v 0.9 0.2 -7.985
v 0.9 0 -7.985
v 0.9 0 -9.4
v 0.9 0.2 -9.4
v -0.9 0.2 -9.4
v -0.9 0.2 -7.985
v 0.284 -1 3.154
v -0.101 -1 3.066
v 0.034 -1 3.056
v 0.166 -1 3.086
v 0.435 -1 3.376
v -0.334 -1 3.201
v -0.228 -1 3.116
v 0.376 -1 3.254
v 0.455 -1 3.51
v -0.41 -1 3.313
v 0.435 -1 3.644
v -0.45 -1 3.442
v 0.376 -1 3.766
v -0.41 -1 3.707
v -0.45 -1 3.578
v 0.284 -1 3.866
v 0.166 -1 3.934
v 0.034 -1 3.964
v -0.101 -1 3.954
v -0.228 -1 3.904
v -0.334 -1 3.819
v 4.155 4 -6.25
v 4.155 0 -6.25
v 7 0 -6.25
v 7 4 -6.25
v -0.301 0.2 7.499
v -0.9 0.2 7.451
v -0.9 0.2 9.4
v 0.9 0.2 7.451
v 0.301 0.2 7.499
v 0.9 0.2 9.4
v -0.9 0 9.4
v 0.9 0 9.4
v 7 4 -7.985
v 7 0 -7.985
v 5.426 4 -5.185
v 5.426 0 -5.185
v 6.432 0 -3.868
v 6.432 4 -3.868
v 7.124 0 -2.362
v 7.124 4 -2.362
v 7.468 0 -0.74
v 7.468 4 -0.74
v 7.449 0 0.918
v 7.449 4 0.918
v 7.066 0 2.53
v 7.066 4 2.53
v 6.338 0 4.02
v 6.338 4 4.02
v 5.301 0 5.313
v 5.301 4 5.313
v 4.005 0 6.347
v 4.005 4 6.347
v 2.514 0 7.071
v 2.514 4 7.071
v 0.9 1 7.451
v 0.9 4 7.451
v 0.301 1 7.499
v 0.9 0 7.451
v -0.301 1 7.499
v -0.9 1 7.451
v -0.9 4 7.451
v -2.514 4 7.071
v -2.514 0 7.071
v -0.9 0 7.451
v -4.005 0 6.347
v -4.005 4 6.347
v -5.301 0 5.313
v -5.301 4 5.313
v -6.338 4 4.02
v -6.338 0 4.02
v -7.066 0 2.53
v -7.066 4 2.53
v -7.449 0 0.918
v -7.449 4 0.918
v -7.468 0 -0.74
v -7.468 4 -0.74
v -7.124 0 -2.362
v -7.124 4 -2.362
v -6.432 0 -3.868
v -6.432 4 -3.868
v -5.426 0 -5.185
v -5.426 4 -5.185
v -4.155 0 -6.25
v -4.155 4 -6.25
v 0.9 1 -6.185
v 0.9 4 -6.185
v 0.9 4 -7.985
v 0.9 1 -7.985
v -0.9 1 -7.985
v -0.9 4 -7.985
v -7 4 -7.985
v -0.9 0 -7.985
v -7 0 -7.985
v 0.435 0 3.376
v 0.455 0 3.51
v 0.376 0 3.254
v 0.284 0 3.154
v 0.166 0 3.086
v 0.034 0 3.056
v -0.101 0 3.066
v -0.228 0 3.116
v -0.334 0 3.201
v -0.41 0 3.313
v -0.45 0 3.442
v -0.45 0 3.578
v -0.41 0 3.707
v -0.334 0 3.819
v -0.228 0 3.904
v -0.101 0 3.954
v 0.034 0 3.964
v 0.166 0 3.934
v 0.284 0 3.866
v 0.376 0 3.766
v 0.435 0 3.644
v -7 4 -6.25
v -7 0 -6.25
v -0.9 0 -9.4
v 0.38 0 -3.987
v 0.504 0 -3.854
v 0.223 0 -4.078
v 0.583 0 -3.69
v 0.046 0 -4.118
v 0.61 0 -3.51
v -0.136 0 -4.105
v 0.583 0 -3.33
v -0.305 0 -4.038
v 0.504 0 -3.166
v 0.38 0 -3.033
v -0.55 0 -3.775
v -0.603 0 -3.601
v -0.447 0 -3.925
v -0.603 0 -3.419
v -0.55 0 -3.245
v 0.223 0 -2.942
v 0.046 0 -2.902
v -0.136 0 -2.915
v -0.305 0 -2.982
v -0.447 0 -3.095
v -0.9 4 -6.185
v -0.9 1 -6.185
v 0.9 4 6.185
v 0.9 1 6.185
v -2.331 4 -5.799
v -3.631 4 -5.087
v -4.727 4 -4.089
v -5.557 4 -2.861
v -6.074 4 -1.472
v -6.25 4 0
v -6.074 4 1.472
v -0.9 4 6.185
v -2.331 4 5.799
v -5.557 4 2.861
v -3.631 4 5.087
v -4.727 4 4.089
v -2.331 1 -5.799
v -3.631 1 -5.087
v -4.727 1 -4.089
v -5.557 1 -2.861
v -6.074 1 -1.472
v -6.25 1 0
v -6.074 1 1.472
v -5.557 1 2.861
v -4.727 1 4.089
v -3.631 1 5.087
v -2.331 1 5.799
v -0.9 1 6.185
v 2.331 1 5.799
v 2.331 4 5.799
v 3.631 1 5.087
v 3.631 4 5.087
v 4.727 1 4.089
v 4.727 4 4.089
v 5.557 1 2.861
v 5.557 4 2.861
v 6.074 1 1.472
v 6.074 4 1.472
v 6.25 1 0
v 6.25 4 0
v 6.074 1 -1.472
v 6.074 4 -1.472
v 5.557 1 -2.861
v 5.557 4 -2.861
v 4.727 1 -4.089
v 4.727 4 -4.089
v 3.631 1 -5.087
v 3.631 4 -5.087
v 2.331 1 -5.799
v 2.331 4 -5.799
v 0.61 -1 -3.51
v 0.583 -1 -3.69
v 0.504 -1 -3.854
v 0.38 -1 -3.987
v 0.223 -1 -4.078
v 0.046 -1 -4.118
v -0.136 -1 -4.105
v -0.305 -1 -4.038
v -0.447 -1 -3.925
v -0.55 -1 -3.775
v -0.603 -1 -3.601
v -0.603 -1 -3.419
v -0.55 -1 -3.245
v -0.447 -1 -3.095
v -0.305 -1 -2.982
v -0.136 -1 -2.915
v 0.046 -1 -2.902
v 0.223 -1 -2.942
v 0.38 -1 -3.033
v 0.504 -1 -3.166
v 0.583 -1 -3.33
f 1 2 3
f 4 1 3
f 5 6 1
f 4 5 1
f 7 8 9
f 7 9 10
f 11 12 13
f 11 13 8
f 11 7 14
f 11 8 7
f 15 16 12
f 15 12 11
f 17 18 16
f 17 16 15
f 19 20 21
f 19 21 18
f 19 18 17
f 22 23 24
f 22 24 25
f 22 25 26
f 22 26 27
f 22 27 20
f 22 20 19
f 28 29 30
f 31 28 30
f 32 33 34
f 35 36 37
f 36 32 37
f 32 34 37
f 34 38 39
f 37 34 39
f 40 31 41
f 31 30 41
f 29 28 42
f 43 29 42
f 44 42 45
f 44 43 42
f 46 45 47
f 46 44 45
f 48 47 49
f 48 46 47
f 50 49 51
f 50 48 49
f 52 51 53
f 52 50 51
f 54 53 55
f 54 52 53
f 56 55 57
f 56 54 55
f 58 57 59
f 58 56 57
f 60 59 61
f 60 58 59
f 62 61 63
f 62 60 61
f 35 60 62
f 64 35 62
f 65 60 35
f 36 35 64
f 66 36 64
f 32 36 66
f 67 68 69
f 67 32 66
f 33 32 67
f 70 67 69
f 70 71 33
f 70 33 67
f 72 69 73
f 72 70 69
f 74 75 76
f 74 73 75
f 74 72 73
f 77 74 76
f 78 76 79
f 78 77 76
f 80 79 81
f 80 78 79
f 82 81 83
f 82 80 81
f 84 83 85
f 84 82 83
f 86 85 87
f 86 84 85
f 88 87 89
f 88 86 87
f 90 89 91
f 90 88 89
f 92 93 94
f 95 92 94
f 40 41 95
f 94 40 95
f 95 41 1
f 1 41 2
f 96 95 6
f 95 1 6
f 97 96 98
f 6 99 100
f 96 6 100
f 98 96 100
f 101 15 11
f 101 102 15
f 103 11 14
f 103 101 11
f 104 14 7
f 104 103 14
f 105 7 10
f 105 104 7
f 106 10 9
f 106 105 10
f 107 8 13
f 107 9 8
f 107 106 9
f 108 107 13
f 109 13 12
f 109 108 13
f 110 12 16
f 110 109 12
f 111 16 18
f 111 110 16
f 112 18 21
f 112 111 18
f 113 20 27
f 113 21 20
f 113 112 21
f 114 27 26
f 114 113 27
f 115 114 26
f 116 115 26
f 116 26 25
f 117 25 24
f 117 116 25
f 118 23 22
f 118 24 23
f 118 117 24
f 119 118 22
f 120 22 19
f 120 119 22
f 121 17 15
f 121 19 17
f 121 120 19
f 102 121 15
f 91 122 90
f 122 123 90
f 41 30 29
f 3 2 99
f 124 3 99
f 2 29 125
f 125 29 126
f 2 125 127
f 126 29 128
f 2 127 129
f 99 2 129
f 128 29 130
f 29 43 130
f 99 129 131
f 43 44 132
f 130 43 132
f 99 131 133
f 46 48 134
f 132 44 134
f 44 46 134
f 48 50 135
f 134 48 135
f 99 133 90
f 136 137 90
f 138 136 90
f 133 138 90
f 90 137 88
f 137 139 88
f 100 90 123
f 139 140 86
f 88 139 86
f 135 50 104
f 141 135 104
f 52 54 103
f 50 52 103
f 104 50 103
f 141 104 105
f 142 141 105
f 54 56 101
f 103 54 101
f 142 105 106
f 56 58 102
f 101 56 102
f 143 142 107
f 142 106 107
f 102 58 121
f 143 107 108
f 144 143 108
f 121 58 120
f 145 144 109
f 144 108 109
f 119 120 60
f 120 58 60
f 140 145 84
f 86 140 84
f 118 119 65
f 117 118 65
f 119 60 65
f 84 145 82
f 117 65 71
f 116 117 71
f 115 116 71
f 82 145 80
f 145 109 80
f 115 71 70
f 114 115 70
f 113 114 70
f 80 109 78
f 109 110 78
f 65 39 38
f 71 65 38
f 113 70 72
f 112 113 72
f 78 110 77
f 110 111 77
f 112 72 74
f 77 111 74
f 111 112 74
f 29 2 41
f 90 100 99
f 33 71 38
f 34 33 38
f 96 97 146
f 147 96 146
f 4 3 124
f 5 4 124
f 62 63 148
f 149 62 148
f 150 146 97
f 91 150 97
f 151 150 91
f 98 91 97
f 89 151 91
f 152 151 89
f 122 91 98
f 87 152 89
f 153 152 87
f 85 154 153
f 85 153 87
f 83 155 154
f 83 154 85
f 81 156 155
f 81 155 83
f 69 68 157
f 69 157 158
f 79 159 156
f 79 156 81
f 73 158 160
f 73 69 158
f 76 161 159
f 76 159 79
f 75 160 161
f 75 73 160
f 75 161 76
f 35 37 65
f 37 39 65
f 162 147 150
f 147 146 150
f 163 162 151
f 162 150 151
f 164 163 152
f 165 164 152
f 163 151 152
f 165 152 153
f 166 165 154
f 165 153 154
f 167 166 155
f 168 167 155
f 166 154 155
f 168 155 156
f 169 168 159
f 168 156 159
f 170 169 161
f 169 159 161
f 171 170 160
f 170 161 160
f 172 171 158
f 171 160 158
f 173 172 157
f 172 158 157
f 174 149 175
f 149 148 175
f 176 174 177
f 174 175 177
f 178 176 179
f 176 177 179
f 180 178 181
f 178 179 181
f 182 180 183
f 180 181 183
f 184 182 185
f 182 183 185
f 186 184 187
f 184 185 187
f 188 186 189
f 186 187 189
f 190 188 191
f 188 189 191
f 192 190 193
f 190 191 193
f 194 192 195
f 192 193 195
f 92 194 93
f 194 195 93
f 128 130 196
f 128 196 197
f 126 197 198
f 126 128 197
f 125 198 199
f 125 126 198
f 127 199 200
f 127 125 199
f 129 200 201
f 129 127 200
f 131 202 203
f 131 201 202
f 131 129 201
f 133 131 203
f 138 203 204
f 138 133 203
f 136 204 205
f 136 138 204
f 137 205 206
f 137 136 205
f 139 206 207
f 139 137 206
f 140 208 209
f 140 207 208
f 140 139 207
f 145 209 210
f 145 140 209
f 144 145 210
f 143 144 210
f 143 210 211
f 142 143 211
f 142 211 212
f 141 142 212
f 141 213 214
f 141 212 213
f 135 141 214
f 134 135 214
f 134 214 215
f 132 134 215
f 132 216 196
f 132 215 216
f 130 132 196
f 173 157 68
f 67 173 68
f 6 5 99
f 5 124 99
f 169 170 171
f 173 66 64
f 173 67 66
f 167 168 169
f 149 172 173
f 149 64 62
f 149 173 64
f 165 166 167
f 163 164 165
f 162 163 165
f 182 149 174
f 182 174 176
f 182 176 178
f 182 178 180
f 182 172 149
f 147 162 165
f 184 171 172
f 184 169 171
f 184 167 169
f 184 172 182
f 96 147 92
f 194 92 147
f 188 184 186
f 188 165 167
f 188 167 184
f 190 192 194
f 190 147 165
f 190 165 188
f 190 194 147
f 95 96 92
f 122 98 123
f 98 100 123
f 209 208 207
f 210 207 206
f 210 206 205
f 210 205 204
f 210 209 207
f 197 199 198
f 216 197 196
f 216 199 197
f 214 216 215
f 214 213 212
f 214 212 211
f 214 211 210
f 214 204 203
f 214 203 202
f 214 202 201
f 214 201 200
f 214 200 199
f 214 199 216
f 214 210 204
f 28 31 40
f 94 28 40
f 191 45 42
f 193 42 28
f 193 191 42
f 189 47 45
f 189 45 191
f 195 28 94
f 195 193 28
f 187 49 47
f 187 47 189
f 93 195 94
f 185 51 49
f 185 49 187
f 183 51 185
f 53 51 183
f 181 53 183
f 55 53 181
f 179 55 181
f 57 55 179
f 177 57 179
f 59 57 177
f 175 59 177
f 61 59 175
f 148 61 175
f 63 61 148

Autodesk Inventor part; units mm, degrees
ref_plane "YZ Plane" through (0, 0, 0) normal (1, 0, 0) x (0, 1, 0)
ref_plane "XZ Plane" through (0, 0, 0) normal (0, 1, 0) x (-1, 0, 0)
ref_plane "XY Plane" through (0, 0, 0) normal (0, 0, 1) x (1, 0, 0)
sketch "Sketch1" plane through (0, 0, 0) normal (0, 1, 0) x (-1, 0, 0)
  arc A0 (4.1548, -6.25) -> (-4.1548, -6.25) centre (0, 0) ccw
  circle A1 centre (0, 0) radius 6.25 construction
  line L0 (-7, -6.25) -> (-7, -7.985)
  line L1 (-7, -7.985) -> (7, -7.985)
  line L2 (7, -7.985) -> (7, -6.25)
  line L3 (0, 7.505) -> (-2.894, 7.505)
  line L4 (7, -6.25) -> (4.1548, -6.25)
  line L5 (-4.1548, -6.25) -> (-7, -6.25)
  dimension "d0" = 15.01
  dimension "d1" = 12.5
  dimension "d2" = 15.49
  dimension "d4" = 14
  dimension "d5" = 7
extrude "Extrusion1" add sketch "Sketch1" along normal blind 4
sketch "Sketch2" plane through (0, 4, 0) normal (0, 1, 0) x (1, 0, 0)
  circle A0 centre (0, 0) radius 6.25
  line L0 (-0.9, -7.9572) -> (0.9, -7.9572)
  line L1 (0.9, -7.9572) -> (0.9, 8.949)
  line L2 (0.9, 8.949) -> (-0.9, 8.949)
  line L3 (-0.9, 8.949) -> (-0.9, -7.9572)
  dimension "d8" = 12.5
  dimension "d11" = 1.8
  dimension "d12" = 0.9
extrude "Extrusion2" cut sketch "Sketch2" against normal blind 3
sketch "Sketch3" plane through (0, 0, 0) normal (0, -1, 0) x (1, 0, 0)
  line L0 (0.9, 5.5692) -> (-0.9, 5.5692)
  line L1 (-0.9, 5.5692) -> (-0.9, 9.4)
  line L2 (-0.9, 9.4) -> (0.9, 9.4)
  line L3 (0.9, 9.4) -> (0.9, 5.5692)
  line L4 (-0.9, -6.2525) -> (0.9, -6.2525)
  line L5 (0.9, -6.2525) -> (0.9, -9.4)
  line L6 (0.9, -9.4) -> (-0.9, -9.4)
  line L7 (-0.9, -9.4) -> (-0.9, -6.2525)
  point P0 (0, 0)
  dimension "d13" = 1.8
  dimension "d14" = 1.8
  dimension "d15" = 0.9
  dimension "d16" = 0.9
  dimension "d17" = 18.8
  dimension "d18" = 9.4
extrude "Extrusion3" add sketch "Sketch3" against normal blind 0.2
sketch "Sketch4" plane through (0, 0, 0) normal (0, -1, 0) x (1, 0, 0)
  circle A0 centre (0, -3.51) radius 0.61
  circle A1 centre (0, 3.51) radius 0.455
  point P0 (0, 0)
  dimension "d21" = 3.51
  dimension "d22" = 3.51
  dimension "d23" = 1.22
  dimension "d24" = 0.91
extrude "Extrusion4" add sketch "Sketch4" along normal blind 1
properties part number "Keystone1056_12_5mmCoinCell"
